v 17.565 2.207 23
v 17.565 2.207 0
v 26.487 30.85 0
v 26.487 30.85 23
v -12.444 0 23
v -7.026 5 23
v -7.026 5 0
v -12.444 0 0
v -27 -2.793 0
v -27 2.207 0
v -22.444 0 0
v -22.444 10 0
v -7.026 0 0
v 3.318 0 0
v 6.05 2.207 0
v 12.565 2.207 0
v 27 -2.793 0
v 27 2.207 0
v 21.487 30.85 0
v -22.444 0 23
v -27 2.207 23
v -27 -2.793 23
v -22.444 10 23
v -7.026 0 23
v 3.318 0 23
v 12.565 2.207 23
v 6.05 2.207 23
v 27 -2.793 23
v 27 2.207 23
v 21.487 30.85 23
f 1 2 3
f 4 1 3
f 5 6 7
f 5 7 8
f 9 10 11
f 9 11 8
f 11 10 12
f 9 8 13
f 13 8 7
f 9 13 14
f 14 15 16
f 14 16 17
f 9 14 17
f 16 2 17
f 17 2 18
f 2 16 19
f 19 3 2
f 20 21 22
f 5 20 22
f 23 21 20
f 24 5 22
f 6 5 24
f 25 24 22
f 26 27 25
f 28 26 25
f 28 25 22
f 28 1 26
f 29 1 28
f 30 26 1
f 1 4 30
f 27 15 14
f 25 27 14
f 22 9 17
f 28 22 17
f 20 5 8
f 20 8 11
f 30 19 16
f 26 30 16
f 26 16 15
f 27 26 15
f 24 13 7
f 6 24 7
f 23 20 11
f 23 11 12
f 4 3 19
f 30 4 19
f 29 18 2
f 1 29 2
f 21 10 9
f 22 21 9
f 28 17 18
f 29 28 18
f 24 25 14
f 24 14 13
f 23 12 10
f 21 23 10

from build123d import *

# Parameters (mm, degrees)
F1_DEPTH = 23


with BuildPart() as f1:
    # F0 (on Top) → F1 (new body)
    with BuildSketch(Plane.XY):
        Polygon((-27, 2.207249), (-27, -2.792751), (27, -2.792751), (27, 2.207249), (17.565055, 2.207249), (12.565055, 2.207249), (6.050185, 2.207249), (3.317844, 0), (-6.682156, 0), (-7.026023, 0), (-7.026023, 5), (-12.444239, 0), (-22.444239, 0), (-22.444239, 10), align=None)
        Polygon((12.565055, 2.207249), (17.565055, 2.207249), (26.487442, 30.849717), (21.487442, 30.849717), align=None)
    extrude(amount=F1_DEPTH)


solid = f1.part
